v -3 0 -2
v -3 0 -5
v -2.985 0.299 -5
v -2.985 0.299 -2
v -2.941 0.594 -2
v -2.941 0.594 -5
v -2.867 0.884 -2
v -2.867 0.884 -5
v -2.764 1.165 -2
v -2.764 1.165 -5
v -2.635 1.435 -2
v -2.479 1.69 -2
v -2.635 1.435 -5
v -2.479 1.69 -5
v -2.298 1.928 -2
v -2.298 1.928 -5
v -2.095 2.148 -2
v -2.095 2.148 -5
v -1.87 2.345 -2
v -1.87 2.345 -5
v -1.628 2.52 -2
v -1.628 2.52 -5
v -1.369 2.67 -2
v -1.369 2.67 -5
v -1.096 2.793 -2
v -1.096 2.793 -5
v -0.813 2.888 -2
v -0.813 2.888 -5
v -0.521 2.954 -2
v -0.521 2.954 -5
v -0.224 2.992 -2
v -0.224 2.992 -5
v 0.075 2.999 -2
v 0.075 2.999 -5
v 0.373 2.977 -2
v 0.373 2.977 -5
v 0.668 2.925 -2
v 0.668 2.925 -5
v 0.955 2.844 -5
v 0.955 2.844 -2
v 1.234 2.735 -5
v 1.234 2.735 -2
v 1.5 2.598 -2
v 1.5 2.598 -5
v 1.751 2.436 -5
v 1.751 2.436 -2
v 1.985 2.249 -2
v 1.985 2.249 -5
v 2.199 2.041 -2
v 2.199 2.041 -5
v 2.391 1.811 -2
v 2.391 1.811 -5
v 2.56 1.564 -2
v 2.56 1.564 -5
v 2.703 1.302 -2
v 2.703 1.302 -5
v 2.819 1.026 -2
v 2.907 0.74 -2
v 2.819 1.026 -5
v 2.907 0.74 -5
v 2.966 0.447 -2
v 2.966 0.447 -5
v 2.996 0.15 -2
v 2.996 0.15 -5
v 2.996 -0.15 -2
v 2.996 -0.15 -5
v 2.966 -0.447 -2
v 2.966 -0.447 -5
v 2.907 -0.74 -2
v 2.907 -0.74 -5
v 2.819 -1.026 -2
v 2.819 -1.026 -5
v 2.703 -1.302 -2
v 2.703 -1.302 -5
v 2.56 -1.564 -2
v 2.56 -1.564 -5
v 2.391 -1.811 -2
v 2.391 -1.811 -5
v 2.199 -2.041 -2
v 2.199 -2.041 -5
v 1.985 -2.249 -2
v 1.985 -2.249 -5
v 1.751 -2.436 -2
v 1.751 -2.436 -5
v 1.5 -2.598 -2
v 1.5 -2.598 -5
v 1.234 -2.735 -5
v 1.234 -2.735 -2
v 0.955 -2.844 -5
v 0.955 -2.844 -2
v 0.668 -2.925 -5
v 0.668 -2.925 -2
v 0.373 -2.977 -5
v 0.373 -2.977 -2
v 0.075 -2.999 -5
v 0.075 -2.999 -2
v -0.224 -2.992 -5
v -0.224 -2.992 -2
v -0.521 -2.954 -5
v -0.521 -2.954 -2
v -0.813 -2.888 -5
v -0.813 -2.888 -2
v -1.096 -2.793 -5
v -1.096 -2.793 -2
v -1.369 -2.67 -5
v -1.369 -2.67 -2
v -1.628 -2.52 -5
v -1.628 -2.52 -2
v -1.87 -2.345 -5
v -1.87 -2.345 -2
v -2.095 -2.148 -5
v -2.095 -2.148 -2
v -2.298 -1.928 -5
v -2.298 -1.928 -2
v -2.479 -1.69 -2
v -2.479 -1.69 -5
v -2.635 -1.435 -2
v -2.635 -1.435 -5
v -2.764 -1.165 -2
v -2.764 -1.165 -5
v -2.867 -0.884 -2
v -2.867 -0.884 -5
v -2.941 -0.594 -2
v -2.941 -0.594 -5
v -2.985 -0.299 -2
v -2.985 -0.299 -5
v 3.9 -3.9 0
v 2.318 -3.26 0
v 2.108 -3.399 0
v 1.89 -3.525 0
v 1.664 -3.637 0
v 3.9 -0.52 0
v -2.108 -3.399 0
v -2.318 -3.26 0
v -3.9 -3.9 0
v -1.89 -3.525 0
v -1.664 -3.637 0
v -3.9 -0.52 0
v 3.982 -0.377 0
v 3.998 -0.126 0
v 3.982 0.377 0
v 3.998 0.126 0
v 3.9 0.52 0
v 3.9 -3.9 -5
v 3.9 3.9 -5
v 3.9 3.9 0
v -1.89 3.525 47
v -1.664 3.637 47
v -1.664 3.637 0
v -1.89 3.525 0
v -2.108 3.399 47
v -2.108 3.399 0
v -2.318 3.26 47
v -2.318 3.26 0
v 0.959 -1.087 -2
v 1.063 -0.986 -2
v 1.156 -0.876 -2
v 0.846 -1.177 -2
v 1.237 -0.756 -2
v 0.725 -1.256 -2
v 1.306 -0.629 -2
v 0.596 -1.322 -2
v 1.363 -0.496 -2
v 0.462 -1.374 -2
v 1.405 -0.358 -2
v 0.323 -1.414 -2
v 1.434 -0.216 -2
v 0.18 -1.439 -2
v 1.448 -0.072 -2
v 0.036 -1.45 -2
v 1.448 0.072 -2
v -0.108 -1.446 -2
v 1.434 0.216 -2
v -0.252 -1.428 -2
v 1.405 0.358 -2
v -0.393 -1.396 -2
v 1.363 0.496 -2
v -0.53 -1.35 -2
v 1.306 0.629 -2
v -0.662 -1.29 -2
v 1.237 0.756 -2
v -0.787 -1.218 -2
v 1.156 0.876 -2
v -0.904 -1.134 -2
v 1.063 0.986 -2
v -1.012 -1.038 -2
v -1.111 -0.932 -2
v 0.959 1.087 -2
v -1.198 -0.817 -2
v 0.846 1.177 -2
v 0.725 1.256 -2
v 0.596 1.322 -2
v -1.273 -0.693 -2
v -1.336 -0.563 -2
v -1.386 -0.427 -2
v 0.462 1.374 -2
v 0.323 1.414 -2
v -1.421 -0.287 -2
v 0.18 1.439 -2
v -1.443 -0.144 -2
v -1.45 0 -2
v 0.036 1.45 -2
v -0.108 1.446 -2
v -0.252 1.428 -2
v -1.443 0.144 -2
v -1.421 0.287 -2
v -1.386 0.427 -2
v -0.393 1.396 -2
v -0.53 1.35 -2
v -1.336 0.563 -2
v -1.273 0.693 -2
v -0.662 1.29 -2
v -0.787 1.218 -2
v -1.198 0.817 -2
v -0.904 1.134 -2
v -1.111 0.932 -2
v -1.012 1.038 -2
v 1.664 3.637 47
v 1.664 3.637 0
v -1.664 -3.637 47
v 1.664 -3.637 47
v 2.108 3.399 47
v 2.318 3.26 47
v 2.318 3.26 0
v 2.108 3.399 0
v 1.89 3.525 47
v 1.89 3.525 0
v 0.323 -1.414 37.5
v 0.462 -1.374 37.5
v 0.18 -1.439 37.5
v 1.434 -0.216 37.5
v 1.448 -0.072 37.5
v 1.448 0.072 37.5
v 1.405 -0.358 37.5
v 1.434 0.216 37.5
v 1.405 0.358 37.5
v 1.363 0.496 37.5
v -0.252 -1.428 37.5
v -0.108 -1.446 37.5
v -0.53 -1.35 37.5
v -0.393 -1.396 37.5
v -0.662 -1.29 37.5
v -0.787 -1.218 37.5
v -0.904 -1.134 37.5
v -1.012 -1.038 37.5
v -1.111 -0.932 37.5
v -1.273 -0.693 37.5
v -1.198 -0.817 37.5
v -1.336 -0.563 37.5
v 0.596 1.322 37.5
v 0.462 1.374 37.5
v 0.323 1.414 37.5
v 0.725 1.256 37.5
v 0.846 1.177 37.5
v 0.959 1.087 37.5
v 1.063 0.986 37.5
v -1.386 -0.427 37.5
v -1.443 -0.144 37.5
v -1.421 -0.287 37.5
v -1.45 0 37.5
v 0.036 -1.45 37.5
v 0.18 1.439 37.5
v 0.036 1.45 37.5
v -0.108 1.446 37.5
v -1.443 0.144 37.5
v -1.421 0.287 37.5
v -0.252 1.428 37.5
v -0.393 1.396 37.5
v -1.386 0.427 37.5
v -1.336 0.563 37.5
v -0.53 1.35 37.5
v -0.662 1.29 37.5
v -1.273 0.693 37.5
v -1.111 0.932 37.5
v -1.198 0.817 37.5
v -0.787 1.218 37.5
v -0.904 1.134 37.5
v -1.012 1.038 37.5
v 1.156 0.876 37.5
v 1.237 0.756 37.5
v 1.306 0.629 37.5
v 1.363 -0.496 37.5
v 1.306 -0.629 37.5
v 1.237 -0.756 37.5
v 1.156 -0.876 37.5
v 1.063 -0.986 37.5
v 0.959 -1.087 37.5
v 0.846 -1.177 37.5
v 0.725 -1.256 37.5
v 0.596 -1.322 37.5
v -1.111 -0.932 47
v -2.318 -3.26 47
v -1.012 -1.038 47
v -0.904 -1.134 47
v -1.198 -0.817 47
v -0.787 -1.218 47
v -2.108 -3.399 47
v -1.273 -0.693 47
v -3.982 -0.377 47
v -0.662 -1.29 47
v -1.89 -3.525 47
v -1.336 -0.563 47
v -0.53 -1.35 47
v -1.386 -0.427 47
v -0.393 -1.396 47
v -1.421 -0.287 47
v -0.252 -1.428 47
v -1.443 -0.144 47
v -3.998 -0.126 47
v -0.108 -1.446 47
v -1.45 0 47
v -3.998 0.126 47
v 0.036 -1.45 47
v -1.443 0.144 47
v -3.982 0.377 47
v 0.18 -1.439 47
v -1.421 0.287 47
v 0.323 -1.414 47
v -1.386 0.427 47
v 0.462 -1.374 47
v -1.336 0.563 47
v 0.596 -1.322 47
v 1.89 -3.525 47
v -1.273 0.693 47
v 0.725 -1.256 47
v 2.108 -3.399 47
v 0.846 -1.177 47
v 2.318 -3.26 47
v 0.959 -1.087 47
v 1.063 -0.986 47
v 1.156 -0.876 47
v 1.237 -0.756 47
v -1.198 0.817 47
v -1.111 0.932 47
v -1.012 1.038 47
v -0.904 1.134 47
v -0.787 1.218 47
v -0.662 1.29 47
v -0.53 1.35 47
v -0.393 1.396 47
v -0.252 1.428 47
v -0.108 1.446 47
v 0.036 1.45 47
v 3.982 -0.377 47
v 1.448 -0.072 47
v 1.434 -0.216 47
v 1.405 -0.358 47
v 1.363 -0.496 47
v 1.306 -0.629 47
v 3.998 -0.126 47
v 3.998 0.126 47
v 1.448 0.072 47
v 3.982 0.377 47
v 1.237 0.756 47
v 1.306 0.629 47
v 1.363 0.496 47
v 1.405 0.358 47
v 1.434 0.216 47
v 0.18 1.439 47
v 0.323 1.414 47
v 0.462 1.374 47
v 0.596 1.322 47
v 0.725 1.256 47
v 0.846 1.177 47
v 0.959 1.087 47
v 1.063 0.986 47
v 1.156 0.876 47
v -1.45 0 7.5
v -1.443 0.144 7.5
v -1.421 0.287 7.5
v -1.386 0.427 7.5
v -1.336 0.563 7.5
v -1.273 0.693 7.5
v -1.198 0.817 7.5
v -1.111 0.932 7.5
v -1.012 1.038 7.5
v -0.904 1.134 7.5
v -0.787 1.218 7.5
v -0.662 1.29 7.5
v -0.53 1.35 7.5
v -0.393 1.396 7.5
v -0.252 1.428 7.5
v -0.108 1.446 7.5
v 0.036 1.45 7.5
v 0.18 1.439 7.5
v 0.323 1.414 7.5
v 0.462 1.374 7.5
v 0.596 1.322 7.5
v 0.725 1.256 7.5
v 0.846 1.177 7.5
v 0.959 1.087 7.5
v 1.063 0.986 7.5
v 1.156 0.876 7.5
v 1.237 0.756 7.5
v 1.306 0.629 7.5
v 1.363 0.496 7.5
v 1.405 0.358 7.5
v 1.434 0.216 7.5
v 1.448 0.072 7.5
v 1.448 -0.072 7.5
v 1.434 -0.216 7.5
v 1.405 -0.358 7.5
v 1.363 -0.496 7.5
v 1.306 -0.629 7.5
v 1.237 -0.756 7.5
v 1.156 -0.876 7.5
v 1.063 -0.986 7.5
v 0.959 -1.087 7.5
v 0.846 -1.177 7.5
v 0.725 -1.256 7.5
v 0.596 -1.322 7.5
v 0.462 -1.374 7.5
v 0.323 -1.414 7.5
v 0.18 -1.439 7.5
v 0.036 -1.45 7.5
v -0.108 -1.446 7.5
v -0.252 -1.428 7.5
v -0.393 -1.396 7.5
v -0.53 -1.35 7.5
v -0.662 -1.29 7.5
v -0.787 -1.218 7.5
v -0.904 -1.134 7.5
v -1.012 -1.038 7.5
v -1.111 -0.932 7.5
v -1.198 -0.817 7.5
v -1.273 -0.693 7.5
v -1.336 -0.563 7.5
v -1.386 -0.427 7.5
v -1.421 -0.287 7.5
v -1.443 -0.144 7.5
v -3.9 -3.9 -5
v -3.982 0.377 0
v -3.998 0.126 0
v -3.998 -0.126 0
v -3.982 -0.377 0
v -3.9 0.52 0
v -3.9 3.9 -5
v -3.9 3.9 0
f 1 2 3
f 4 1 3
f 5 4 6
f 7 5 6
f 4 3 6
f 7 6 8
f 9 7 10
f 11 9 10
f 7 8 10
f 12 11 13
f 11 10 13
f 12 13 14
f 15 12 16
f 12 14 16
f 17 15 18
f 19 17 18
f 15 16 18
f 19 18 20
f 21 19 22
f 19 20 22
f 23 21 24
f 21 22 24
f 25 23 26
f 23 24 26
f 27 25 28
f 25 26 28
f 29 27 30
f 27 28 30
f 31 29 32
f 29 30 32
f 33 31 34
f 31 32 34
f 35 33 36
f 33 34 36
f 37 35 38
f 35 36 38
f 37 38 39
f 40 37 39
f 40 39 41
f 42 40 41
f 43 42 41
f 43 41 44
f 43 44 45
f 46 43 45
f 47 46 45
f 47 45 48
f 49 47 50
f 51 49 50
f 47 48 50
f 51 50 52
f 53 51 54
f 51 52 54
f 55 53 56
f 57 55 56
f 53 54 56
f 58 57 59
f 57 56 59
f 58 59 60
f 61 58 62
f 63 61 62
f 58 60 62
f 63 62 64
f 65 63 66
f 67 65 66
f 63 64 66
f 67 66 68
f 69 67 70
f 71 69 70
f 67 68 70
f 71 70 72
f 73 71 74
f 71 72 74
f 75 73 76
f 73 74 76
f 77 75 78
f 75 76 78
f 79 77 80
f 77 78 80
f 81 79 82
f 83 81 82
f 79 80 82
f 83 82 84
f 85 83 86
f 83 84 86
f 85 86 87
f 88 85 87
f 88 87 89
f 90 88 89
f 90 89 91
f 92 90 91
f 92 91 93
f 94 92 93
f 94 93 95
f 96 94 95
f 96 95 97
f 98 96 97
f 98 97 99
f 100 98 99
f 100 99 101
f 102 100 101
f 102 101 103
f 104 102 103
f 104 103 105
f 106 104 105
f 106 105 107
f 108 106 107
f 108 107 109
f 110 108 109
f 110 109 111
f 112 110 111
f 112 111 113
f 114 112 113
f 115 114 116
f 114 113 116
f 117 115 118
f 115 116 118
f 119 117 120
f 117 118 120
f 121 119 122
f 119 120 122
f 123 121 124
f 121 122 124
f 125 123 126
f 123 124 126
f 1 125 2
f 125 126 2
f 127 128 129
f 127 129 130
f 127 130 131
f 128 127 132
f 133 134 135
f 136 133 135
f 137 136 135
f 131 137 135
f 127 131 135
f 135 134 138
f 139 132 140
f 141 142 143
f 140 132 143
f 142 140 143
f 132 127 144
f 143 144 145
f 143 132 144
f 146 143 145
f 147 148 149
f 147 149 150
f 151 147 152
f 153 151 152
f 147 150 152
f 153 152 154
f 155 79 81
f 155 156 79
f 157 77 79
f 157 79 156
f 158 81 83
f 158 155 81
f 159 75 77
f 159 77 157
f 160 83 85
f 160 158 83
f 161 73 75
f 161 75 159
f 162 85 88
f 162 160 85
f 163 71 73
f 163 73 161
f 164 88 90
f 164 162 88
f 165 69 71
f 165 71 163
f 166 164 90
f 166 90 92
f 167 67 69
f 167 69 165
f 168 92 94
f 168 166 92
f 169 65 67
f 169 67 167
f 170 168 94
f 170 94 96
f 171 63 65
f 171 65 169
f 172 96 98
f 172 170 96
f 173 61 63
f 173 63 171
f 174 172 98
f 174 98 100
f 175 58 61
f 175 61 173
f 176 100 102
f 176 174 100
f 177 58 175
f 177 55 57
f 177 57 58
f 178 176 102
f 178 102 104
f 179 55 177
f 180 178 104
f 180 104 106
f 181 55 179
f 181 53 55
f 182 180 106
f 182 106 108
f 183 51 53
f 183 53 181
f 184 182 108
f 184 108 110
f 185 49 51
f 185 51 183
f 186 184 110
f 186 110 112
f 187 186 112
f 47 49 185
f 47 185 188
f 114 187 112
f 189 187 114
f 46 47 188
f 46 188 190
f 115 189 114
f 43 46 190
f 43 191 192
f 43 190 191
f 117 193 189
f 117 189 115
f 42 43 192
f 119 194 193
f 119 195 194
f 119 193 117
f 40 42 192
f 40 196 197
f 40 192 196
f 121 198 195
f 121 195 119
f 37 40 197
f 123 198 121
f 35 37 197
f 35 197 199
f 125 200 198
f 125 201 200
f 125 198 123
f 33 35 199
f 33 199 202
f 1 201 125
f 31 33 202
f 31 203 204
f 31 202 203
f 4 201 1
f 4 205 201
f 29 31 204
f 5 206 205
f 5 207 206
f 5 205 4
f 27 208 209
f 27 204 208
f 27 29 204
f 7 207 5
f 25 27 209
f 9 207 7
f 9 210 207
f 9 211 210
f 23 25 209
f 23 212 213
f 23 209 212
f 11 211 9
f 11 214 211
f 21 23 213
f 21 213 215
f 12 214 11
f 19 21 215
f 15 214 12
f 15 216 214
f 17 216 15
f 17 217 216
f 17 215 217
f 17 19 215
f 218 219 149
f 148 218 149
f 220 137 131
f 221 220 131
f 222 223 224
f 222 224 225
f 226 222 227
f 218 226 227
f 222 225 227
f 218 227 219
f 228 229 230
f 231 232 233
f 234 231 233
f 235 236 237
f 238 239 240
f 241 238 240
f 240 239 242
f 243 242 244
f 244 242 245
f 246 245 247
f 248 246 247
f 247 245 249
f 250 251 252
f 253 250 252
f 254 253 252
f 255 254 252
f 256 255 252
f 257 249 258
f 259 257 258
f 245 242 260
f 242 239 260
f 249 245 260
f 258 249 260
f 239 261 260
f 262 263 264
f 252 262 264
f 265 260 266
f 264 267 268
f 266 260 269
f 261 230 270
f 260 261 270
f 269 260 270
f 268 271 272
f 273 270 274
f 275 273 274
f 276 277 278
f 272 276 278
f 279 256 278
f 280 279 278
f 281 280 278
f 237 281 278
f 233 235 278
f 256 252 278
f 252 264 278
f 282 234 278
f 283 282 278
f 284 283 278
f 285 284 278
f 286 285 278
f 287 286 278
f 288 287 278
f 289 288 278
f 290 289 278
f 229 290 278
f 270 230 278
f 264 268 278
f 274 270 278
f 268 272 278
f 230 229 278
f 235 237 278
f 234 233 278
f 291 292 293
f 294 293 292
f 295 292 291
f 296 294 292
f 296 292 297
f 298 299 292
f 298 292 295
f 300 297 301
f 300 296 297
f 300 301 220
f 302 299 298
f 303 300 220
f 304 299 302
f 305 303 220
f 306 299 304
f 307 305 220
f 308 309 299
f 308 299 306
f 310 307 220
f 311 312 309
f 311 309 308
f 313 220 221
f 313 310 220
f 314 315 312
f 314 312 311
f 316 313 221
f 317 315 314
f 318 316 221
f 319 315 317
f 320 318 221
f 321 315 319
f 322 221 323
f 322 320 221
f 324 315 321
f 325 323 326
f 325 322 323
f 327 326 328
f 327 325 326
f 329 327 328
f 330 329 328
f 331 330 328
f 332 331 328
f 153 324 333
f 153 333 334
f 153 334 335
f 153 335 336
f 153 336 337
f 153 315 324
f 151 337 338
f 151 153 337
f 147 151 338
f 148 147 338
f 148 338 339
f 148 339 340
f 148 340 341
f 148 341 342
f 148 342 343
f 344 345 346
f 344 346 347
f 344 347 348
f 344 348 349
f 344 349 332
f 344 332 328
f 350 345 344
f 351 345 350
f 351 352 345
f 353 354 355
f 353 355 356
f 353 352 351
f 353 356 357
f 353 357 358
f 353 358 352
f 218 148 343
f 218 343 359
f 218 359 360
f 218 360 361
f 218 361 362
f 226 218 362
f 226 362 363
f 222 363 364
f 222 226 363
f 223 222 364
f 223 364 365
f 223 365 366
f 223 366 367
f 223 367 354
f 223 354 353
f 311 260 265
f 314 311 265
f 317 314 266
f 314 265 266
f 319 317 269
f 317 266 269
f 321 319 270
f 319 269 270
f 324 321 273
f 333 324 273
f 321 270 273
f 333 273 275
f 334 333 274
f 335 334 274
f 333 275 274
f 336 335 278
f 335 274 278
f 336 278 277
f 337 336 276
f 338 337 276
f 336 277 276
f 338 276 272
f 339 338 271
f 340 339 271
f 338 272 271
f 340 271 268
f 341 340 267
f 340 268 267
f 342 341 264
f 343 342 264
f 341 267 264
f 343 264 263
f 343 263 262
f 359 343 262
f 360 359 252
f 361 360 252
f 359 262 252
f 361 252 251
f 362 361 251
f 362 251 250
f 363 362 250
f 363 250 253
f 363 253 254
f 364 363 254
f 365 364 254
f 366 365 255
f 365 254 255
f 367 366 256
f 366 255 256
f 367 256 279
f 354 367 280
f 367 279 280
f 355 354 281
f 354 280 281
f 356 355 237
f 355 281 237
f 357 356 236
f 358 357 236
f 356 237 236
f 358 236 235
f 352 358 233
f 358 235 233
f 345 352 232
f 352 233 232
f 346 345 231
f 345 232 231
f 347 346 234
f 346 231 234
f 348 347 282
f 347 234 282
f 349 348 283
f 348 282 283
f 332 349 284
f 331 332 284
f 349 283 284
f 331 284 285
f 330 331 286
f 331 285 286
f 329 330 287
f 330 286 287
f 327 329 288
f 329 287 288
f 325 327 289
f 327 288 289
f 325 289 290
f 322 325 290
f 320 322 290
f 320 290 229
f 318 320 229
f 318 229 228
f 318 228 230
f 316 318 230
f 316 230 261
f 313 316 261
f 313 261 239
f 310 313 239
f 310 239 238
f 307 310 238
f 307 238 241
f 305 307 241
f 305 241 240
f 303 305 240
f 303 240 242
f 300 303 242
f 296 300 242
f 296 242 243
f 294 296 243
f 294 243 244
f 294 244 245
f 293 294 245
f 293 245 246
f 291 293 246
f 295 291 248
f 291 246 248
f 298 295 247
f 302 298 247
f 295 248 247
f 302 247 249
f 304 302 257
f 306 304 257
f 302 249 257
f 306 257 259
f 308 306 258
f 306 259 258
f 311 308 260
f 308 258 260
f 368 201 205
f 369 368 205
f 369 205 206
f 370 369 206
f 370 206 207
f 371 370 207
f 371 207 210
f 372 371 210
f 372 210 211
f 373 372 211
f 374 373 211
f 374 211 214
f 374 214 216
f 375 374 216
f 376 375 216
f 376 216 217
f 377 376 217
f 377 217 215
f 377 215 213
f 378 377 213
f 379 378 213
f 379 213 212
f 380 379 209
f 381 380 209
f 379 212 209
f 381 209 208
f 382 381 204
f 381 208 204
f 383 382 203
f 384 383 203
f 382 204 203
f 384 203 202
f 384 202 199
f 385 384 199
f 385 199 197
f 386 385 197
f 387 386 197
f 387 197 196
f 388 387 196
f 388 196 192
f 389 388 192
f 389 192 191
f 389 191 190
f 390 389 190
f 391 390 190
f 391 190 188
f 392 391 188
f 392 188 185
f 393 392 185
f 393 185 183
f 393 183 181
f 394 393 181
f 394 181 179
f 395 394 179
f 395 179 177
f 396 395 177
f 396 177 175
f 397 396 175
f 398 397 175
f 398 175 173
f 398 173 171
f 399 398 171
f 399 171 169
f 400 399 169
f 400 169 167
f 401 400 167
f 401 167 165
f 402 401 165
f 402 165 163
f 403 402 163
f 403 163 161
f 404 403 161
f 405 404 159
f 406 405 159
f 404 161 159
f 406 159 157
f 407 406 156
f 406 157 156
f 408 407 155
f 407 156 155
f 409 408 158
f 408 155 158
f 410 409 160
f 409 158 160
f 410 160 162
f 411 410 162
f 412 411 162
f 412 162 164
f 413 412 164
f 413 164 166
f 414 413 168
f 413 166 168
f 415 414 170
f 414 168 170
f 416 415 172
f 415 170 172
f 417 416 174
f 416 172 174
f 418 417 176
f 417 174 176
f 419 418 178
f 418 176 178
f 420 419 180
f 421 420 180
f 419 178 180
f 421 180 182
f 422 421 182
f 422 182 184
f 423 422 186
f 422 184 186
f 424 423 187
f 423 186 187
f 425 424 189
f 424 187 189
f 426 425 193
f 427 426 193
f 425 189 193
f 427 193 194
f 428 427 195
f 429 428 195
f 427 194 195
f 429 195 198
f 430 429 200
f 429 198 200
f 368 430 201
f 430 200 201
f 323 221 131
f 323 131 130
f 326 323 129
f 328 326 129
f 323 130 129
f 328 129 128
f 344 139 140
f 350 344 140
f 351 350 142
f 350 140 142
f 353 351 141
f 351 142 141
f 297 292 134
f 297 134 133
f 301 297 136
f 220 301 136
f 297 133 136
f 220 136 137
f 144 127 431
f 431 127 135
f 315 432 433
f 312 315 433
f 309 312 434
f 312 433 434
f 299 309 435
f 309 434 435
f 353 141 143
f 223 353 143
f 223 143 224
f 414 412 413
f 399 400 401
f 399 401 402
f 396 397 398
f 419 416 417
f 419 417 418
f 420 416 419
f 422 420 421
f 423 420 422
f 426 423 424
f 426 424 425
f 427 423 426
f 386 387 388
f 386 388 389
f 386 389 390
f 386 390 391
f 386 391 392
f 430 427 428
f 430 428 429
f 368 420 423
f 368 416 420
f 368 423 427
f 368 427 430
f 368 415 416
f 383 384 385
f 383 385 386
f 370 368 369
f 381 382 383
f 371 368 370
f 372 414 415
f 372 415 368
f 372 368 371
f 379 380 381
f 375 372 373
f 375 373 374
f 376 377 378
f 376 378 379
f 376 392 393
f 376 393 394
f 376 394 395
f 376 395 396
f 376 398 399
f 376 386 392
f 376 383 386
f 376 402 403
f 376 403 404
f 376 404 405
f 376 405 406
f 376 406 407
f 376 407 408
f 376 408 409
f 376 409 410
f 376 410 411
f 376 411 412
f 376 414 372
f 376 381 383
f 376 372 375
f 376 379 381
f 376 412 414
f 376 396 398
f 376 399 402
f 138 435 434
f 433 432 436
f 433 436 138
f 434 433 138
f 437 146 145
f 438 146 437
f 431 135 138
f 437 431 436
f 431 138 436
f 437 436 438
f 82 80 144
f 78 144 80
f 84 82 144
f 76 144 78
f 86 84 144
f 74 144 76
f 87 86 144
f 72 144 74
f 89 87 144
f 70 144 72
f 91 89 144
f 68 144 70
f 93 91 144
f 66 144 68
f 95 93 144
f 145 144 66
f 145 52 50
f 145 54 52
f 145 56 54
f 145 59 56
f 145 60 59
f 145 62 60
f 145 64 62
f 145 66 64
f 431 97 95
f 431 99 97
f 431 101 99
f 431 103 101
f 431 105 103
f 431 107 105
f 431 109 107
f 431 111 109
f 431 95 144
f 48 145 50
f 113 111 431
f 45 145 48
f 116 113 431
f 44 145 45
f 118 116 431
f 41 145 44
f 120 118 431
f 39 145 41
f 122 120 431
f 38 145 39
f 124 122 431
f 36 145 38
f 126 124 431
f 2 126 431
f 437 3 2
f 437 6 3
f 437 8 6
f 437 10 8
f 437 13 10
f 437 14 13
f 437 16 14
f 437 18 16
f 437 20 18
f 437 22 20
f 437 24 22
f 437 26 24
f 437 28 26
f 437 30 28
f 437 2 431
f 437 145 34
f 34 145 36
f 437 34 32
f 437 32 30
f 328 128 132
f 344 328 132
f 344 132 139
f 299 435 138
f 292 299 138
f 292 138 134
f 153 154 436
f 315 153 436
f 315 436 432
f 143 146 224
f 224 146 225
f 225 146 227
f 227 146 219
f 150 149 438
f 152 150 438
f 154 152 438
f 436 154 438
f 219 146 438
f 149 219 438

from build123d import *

# Parameters (mm, degrees)
EXTRUDE_1_DEPTH     = 47
SKETCH_2_W          = 7.8
SKETCH_2_H          = 7.8
EXTRUDE_2_DEPTH     = 5
SKETCH_3_R          = 1.45
CUT_EXTRUDE_1_DEPTH = 12.5
SKETCH_4_R          = 3
CUT_EXTRUDE_2_DEPTH = 3
CUT_EXTRUDE_START   = -42.5
SKETCH_3_2_R        = 1.45
CUT_EXTRUDE_3_DEPTH = 9.5


with BuildPart() as part:
    # Эскиз1 → Бобышка-Вытянуть1 (new body)
    with BuildSketch(Plane.XY):
        with BuildLine():
            Line((1.664331698, 3.637306696), (-1.664331698, 3.637306696))
            ThreePointArc((-1.664331698, 3.637306696), (-2, 3.464101615), (-2.317834151, 3.260006878))
            Line((-2.317834151, 3.260006878), (-3.982165849, 0.377299817))
            ThreePointArc((-3.982165849, 0.377299817), (-4, 0), (-3.982165849, -0.377299817))
            Line((-3.982165849, -0.377299817), (-2.317834151, -3.260006878))
            ThreePointArc((-2.317834151, -3.260006878), (-2, -3.464101615), (-1.664331698, -3.637306696))
            Line((-1.664331698, -3.637306696), (1.664331698, -3.637306696))
            ThreePointArc((1.664331698, -3.637306696), (2, -3.464101615), (2.317834151, -3.260006878))
            Line((2.317834151, -3.260006878), (3.982165849, -0.377299817))
            ThreePointArc((3.982165849, -0.377299817), (4, 0), (3.982165849, 0.377299817))
            Line((3.982165849, 0.377299817), (2.317834151, 3.260006878))
            ThreePointArc((2.317834151, 3.260006878), (2, 3.464101615), (1.664331698, 3.637306696))
        make_face()
    extrude(amount=EXTRUDE_1_DEPTH)

    # Эскиз2 → Бобышка-Вытянуть2 (add)
    with BuildSketch(Plane(origin=(0, 0, 0), x_dir=(-1, 0, 0), z_dir=(0, 0, -1))):
        Rectangle(SKETCH_2_W, SKETCH_2_H)
    extrude(amount=EXTRUDE_2_DEPTH)

    # Эскиз3 → Вырез-Вытянуть1 (cut)
    with BuildSketch(Plane(origin=(0, 0, -5), x_dir=(-1, 0, 0), z_dir=(0, 0, -1))):
        Circle(SKETCH_3_R)
    extrude(amount=-CUT_EXTRUDE_1_DEPTH, mode=Mode.SUBTRACT)

    # Эскиз4 → Вырез-Вытянуть2 (cut)
    with BuildSketch(Plane(origin=(0, 0, -5), x_dir=(-1, 0, 0), z_dir=(0, 0, -1))):
        Circle(SKETCH_4_R)
    extrude(amount=-CUT_EXTRUDE_2_DEPTH, mode=Mode.SUBTRACT)

    # Эскиз3<2> → Вырез-Вытянуть3 (cut)
    with BuildSketch(Plane(origin=(0, 0, -5), x_dir=(-1, 0, 0), z_dir=(0, 0, -1)).offset(CUT_EXTRUDE_START)):
        Circle(SKETCH_3_2_R)
    extrude(amount=-CUT_EXTRUDE_3_DEPTH, mode=Mode.SUBTRACT)


solid = part.part
